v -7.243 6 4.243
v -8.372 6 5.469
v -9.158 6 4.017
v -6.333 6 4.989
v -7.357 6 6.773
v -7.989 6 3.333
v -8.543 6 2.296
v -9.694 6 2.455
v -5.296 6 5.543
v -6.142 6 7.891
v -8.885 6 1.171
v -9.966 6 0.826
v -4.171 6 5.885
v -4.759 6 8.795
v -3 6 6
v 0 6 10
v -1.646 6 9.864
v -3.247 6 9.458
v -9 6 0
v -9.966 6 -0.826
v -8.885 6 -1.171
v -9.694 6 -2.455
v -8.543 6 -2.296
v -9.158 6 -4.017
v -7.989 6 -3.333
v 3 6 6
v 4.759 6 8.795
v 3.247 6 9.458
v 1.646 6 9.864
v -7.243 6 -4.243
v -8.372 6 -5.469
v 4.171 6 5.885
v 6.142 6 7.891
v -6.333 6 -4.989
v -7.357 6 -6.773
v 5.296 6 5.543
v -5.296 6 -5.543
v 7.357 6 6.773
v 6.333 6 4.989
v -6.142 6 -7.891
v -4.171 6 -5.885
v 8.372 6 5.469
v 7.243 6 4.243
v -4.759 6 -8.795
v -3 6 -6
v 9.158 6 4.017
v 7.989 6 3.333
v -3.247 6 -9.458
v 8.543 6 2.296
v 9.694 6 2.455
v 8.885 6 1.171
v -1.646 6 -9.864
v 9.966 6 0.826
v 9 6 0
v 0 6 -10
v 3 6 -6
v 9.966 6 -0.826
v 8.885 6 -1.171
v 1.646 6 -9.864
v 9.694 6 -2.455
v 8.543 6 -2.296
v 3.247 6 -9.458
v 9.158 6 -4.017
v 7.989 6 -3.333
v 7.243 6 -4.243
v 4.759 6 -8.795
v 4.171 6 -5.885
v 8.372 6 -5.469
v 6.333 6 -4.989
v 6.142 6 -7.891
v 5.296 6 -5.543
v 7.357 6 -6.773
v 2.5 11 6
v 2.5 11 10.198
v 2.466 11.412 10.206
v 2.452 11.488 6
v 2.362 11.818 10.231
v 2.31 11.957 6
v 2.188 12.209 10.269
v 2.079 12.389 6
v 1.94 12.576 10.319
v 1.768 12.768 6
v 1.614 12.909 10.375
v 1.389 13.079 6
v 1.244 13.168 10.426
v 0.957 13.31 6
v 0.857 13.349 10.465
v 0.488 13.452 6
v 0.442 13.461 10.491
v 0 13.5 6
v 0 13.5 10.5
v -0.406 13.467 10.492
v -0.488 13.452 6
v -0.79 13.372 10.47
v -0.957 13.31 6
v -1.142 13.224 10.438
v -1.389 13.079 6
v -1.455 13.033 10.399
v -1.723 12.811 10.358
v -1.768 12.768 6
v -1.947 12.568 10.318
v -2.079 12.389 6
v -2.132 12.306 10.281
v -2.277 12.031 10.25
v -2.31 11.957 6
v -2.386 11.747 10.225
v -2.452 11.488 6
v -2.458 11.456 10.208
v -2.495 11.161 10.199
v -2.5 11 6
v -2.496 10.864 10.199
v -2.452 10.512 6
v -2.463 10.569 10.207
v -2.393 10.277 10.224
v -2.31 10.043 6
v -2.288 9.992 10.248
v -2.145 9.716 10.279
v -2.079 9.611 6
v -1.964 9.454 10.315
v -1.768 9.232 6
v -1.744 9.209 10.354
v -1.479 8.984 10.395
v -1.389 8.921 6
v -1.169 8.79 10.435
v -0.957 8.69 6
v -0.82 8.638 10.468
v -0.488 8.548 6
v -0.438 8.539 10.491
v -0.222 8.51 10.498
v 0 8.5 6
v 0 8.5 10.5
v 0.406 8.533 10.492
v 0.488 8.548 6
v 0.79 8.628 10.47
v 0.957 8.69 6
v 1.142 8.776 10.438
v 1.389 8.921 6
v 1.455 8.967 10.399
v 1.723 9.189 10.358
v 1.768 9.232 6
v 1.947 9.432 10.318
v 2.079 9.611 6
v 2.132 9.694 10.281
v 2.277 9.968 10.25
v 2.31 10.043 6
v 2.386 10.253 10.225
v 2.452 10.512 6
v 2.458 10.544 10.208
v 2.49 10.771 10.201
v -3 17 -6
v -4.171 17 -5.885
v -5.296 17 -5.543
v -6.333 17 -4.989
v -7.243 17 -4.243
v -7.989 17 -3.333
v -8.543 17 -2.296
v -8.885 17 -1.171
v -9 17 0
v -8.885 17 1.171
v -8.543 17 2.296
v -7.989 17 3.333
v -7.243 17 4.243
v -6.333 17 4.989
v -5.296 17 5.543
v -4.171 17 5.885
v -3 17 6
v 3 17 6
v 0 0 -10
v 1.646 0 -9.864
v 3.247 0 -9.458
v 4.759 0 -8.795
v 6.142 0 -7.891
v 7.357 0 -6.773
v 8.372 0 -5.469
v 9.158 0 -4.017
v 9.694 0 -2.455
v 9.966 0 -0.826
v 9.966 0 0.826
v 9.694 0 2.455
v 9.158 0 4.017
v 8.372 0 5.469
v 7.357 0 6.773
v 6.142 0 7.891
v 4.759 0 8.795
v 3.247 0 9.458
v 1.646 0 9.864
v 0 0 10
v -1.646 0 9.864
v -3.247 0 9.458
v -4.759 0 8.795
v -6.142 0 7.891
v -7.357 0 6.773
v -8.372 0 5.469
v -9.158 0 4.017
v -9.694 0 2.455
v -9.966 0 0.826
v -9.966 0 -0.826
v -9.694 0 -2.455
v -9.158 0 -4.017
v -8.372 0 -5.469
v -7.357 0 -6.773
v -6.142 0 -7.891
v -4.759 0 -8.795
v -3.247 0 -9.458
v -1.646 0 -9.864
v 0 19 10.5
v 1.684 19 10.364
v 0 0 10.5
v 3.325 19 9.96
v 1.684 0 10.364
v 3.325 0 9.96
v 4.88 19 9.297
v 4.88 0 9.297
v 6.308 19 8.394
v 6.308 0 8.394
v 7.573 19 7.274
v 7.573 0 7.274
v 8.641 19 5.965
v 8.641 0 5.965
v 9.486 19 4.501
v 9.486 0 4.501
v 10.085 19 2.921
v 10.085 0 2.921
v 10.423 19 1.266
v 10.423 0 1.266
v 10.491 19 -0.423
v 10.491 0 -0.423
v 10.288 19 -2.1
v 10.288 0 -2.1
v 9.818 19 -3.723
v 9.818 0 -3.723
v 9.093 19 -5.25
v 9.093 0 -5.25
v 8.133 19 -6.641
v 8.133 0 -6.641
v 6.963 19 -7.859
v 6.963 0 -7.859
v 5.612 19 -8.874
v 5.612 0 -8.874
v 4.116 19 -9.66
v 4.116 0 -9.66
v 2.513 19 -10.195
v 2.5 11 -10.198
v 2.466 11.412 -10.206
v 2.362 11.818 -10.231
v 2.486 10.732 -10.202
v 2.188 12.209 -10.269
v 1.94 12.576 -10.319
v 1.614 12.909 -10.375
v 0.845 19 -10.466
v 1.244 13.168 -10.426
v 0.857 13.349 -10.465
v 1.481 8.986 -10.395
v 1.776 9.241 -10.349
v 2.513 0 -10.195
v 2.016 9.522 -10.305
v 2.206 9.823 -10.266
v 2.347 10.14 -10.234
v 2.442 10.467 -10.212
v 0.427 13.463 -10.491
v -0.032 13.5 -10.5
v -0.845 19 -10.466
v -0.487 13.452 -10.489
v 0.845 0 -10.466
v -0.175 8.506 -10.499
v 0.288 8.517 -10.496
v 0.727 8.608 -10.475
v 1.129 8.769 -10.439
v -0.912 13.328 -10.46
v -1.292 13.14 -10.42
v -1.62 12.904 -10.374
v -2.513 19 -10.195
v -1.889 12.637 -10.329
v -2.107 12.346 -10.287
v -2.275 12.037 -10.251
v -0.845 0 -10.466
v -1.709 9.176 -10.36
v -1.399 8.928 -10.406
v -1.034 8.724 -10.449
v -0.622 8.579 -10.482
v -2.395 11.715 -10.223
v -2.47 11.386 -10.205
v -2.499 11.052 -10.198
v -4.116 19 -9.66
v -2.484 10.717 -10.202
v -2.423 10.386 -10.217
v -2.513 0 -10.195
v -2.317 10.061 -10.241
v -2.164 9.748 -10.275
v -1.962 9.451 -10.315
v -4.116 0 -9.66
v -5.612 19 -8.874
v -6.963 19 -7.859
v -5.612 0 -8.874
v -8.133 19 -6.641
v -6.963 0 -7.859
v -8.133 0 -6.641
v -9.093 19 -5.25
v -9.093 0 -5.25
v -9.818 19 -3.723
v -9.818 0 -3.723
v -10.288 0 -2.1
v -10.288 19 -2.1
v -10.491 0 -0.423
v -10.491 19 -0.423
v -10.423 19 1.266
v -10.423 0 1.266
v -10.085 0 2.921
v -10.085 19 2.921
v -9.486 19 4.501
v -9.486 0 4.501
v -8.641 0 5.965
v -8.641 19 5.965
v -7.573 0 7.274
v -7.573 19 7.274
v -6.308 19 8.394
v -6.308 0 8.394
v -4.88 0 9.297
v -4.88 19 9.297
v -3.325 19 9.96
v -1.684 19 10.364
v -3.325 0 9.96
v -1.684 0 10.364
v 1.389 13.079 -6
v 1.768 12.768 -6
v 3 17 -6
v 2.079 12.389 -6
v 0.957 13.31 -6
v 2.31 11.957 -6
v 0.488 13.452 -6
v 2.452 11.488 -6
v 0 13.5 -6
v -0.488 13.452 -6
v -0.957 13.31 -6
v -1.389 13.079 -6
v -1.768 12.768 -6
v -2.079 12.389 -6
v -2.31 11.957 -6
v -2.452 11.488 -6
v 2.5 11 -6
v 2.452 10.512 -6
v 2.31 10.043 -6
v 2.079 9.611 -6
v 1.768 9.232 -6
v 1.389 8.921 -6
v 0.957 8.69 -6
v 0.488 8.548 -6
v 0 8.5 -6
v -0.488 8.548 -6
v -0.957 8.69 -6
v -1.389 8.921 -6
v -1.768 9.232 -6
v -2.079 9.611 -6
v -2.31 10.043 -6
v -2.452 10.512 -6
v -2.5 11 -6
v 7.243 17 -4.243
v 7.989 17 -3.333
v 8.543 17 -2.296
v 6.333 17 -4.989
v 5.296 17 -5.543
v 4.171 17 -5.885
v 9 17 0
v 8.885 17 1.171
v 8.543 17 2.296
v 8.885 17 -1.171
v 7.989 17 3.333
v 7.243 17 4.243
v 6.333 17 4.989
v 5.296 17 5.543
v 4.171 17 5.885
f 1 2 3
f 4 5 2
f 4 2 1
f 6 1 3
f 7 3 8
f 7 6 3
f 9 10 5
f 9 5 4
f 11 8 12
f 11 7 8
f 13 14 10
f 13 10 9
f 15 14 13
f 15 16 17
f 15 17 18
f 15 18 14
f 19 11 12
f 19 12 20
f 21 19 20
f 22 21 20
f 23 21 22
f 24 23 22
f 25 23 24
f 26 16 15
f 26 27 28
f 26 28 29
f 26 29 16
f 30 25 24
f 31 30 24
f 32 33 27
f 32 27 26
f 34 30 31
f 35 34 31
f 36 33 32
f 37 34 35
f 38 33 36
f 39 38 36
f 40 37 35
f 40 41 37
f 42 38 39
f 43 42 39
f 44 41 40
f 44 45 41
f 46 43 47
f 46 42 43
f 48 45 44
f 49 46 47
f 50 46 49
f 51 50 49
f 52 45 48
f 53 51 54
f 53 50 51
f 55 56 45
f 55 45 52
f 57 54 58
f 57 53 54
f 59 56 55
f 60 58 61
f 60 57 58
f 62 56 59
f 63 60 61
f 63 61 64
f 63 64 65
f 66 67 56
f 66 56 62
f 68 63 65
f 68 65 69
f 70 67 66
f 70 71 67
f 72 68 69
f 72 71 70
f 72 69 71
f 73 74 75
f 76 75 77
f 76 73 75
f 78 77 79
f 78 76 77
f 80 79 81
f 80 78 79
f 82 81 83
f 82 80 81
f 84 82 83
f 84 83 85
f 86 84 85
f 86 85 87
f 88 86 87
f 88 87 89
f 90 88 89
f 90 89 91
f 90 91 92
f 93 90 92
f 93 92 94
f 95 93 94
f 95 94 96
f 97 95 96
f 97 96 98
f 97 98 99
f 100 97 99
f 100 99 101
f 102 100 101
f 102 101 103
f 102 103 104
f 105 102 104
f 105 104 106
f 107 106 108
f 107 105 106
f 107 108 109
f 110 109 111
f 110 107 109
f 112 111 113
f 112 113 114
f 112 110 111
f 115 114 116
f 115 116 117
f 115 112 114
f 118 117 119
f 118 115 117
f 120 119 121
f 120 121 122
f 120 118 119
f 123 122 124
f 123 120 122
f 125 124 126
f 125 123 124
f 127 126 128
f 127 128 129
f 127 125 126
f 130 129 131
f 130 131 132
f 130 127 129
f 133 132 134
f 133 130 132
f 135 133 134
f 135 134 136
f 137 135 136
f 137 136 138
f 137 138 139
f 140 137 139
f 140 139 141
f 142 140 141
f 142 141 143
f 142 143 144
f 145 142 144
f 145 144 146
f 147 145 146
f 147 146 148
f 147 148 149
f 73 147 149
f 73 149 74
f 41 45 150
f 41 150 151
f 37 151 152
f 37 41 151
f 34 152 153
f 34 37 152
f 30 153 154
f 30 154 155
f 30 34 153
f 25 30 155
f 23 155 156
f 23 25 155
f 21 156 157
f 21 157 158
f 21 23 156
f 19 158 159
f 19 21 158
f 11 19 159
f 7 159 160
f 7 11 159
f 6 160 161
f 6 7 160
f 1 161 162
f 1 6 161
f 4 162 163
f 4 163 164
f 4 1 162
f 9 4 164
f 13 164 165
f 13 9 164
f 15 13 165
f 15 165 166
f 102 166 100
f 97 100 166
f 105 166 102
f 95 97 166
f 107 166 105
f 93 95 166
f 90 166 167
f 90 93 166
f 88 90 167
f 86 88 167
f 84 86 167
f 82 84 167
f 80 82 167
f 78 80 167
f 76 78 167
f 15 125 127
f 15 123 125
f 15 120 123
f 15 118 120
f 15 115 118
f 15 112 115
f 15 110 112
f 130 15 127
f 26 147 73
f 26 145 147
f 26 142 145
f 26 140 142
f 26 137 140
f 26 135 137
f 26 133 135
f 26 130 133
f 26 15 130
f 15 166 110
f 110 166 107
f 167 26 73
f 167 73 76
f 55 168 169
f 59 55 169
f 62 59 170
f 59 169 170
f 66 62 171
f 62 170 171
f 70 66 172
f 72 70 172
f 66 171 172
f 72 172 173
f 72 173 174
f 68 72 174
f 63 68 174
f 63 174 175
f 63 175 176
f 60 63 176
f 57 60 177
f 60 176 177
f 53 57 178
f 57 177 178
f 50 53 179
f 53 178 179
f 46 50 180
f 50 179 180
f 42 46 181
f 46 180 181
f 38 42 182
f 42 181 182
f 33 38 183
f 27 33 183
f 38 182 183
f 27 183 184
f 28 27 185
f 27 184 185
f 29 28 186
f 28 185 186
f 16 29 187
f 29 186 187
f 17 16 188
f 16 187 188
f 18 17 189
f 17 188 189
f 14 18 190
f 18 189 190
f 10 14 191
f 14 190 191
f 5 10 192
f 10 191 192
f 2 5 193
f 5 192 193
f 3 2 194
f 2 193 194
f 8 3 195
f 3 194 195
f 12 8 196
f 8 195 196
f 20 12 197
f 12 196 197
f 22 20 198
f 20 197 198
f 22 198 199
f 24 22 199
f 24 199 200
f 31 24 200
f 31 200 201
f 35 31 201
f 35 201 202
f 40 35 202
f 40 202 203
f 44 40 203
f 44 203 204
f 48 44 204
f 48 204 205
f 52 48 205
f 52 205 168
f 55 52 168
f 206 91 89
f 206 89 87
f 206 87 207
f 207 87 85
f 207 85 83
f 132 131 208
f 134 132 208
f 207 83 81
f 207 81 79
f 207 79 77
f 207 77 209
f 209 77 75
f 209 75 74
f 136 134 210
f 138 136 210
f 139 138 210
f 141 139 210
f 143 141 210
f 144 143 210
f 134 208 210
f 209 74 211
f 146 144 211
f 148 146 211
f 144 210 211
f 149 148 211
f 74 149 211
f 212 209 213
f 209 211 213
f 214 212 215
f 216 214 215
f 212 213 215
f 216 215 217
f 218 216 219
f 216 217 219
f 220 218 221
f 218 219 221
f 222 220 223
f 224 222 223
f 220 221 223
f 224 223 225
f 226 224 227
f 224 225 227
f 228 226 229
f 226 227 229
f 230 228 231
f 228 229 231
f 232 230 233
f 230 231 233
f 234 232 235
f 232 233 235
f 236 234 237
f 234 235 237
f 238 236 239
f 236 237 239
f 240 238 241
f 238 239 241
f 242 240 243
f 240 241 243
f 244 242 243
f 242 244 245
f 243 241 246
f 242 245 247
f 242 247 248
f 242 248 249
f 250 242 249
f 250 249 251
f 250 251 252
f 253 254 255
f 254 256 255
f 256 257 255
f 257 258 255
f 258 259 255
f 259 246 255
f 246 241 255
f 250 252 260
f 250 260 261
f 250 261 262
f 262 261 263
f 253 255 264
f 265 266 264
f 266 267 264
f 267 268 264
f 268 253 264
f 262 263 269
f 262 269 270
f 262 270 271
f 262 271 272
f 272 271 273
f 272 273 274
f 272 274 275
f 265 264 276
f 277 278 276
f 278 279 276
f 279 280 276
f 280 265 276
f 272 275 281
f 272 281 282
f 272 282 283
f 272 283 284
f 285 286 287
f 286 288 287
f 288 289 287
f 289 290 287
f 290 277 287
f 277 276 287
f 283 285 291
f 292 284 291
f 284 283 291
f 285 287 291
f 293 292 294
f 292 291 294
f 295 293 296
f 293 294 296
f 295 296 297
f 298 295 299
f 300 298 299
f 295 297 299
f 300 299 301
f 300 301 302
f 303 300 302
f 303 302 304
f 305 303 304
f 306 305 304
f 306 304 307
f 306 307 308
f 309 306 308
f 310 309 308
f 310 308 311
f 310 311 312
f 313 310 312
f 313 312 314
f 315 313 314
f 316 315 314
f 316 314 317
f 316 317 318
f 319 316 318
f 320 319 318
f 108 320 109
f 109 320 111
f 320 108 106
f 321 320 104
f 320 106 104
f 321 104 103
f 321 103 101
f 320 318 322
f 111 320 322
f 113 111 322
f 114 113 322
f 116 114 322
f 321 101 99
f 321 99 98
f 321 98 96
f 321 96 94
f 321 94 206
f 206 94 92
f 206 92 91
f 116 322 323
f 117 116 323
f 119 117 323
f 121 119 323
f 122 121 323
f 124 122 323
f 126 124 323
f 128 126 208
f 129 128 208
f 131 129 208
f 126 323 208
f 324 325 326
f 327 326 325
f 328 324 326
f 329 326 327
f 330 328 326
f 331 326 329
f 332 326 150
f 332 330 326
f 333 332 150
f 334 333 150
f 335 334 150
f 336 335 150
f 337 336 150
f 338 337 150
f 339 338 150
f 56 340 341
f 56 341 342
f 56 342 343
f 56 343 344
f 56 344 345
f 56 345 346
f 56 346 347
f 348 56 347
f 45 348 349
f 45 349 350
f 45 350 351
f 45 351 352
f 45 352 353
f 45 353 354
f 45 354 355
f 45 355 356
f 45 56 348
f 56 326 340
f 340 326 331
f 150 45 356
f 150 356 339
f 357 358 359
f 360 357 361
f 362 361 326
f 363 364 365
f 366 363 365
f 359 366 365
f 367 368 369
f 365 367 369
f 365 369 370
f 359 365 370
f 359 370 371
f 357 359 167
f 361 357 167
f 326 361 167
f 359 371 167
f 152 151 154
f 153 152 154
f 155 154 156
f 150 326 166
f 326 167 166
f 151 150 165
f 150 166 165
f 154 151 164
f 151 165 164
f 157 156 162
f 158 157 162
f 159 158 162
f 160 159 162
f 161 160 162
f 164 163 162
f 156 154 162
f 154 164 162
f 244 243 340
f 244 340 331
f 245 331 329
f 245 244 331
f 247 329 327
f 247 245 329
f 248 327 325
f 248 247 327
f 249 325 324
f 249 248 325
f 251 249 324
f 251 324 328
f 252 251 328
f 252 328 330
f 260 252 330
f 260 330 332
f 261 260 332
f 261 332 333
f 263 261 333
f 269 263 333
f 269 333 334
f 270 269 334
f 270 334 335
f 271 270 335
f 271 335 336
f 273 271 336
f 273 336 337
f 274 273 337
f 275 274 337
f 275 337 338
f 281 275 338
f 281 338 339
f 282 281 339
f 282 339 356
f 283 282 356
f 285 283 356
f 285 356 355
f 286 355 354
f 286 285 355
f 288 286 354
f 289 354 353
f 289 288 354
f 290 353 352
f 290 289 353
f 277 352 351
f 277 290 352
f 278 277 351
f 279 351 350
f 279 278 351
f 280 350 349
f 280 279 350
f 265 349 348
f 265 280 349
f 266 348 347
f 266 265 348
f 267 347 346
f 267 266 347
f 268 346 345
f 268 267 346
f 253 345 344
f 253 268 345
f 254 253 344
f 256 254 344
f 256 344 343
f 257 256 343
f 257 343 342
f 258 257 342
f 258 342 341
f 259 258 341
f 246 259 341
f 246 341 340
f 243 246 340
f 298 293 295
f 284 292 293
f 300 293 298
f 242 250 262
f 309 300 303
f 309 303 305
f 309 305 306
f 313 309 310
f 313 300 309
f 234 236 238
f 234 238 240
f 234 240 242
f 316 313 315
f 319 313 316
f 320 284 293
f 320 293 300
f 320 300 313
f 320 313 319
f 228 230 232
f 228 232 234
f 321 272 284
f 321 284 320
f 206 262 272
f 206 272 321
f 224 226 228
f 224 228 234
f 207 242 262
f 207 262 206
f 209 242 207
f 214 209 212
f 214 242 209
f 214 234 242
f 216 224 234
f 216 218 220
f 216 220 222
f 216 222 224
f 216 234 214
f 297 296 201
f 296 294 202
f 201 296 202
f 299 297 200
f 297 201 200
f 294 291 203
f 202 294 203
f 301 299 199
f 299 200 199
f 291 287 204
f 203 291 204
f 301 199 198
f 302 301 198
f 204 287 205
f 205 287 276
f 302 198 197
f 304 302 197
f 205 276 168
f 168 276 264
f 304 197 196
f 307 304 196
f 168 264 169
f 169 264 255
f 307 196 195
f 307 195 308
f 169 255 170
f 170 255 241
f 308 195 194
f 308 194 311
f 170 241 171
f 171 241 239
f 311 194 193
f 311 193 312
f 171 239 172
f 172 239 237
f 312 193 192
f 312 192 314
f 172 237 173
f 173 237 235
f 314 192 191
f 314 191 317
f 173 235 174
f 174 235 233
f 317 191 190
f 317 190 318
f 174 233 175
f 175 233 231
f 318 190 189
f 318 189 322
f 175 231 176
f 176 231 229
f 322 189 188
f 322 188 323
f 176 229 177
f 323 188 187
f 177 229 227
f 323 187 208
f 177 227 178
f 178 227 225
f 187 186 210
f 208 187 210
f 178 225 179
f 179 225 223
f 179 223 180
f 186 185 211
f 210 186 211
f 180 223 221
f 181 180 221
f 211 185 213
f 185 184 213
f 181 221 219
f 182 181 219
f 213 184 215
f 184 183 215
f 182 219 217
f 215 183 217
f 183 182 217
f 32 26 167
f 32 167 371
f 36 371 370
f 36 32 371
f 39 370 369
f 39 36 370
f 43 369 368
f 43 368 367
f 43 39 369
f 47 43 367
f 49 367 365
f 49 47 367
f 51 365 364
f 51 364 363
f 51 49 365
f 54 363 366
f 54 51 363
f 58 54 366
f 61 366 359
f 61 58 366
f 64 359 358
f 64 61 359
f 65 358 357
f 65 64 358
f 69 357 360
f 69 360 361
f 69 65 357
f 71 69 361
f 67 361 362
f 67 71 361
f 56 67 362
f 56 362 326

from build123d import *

# Parameters (mm, degrees)
SKETCH1_R               = 10.5
BOSS_EXTRUDE1_DEPTH     = 19
SKETCH2_R               = 10
CUT_EXTRUDE1_DEPTH      = 6
CUT_EXTRUDE2_DEPTH      = 11
CUT_EXTRUDE3_DEPTH      = 25.114311104
CUT_EXTRUDE3_DEPTH_BACK = 25.114311104
SKETCH4_R               = 2.5


with BuildPart() as part:
    # Sketch1 → Boss-Extrude1 (new body)
    with BuildSketch(Plane(origin=(0, 0, 0), x_dir=(1, 0, 0), z_dir=(0, 1, 0))):
        with Locations(Location((0, 0, 0), (0, 0, 270))):
            Circle(SKETCH1_R)
    extrude(amount=BOSS_EXTRUDE1_DEPTH)

    # Sketch2 → Cut-Extrude1 (cut)
    with BuildSketch(Plane.XZ):
        with Locations(Location((0, 0, 0), (0, 0, 270))):
            Circle(SKETCH2_R)
    extrude(amount=-CUT_EXTRUDE1_DEPTH, mode=Mode.SUBTRACT)

    # Sketch3 → Cut-Extrude2 (cut)
    with BuildSketch(Plane.XZ.offset(-6)):
        with BuildLine():
            Line((3, -6), (-3, -6))
            ThreePointArc((-3, -6), (-9, 0), (-3, 6))
            Line((-3, 6), (3, 6))
            ThreePointArc((3, 6), (9, 0), (3, -6))
        make_face()
    extrude(amount=-CUT_EXTRUDE2_DEPTH, mode=Mode.SUBTRACT)

    # Sketch4 → Cut-Extrude3 (cut, two sides: drawn at the far end of the back side and taken through both)
    with BuildSketch(Plane.XY.offset(-CUT_EXTRUDE3_DEPTH_BACK)):
        with Locations((0, 11)):
            Circle(SKETCH4_R)
    extrude(amount=CUT_EXTRUDE3_DEPTH + CUT_EXTRUDE3_DEPTH_BACK, mode=Mode.SUBTRACT)


solid = part.part
